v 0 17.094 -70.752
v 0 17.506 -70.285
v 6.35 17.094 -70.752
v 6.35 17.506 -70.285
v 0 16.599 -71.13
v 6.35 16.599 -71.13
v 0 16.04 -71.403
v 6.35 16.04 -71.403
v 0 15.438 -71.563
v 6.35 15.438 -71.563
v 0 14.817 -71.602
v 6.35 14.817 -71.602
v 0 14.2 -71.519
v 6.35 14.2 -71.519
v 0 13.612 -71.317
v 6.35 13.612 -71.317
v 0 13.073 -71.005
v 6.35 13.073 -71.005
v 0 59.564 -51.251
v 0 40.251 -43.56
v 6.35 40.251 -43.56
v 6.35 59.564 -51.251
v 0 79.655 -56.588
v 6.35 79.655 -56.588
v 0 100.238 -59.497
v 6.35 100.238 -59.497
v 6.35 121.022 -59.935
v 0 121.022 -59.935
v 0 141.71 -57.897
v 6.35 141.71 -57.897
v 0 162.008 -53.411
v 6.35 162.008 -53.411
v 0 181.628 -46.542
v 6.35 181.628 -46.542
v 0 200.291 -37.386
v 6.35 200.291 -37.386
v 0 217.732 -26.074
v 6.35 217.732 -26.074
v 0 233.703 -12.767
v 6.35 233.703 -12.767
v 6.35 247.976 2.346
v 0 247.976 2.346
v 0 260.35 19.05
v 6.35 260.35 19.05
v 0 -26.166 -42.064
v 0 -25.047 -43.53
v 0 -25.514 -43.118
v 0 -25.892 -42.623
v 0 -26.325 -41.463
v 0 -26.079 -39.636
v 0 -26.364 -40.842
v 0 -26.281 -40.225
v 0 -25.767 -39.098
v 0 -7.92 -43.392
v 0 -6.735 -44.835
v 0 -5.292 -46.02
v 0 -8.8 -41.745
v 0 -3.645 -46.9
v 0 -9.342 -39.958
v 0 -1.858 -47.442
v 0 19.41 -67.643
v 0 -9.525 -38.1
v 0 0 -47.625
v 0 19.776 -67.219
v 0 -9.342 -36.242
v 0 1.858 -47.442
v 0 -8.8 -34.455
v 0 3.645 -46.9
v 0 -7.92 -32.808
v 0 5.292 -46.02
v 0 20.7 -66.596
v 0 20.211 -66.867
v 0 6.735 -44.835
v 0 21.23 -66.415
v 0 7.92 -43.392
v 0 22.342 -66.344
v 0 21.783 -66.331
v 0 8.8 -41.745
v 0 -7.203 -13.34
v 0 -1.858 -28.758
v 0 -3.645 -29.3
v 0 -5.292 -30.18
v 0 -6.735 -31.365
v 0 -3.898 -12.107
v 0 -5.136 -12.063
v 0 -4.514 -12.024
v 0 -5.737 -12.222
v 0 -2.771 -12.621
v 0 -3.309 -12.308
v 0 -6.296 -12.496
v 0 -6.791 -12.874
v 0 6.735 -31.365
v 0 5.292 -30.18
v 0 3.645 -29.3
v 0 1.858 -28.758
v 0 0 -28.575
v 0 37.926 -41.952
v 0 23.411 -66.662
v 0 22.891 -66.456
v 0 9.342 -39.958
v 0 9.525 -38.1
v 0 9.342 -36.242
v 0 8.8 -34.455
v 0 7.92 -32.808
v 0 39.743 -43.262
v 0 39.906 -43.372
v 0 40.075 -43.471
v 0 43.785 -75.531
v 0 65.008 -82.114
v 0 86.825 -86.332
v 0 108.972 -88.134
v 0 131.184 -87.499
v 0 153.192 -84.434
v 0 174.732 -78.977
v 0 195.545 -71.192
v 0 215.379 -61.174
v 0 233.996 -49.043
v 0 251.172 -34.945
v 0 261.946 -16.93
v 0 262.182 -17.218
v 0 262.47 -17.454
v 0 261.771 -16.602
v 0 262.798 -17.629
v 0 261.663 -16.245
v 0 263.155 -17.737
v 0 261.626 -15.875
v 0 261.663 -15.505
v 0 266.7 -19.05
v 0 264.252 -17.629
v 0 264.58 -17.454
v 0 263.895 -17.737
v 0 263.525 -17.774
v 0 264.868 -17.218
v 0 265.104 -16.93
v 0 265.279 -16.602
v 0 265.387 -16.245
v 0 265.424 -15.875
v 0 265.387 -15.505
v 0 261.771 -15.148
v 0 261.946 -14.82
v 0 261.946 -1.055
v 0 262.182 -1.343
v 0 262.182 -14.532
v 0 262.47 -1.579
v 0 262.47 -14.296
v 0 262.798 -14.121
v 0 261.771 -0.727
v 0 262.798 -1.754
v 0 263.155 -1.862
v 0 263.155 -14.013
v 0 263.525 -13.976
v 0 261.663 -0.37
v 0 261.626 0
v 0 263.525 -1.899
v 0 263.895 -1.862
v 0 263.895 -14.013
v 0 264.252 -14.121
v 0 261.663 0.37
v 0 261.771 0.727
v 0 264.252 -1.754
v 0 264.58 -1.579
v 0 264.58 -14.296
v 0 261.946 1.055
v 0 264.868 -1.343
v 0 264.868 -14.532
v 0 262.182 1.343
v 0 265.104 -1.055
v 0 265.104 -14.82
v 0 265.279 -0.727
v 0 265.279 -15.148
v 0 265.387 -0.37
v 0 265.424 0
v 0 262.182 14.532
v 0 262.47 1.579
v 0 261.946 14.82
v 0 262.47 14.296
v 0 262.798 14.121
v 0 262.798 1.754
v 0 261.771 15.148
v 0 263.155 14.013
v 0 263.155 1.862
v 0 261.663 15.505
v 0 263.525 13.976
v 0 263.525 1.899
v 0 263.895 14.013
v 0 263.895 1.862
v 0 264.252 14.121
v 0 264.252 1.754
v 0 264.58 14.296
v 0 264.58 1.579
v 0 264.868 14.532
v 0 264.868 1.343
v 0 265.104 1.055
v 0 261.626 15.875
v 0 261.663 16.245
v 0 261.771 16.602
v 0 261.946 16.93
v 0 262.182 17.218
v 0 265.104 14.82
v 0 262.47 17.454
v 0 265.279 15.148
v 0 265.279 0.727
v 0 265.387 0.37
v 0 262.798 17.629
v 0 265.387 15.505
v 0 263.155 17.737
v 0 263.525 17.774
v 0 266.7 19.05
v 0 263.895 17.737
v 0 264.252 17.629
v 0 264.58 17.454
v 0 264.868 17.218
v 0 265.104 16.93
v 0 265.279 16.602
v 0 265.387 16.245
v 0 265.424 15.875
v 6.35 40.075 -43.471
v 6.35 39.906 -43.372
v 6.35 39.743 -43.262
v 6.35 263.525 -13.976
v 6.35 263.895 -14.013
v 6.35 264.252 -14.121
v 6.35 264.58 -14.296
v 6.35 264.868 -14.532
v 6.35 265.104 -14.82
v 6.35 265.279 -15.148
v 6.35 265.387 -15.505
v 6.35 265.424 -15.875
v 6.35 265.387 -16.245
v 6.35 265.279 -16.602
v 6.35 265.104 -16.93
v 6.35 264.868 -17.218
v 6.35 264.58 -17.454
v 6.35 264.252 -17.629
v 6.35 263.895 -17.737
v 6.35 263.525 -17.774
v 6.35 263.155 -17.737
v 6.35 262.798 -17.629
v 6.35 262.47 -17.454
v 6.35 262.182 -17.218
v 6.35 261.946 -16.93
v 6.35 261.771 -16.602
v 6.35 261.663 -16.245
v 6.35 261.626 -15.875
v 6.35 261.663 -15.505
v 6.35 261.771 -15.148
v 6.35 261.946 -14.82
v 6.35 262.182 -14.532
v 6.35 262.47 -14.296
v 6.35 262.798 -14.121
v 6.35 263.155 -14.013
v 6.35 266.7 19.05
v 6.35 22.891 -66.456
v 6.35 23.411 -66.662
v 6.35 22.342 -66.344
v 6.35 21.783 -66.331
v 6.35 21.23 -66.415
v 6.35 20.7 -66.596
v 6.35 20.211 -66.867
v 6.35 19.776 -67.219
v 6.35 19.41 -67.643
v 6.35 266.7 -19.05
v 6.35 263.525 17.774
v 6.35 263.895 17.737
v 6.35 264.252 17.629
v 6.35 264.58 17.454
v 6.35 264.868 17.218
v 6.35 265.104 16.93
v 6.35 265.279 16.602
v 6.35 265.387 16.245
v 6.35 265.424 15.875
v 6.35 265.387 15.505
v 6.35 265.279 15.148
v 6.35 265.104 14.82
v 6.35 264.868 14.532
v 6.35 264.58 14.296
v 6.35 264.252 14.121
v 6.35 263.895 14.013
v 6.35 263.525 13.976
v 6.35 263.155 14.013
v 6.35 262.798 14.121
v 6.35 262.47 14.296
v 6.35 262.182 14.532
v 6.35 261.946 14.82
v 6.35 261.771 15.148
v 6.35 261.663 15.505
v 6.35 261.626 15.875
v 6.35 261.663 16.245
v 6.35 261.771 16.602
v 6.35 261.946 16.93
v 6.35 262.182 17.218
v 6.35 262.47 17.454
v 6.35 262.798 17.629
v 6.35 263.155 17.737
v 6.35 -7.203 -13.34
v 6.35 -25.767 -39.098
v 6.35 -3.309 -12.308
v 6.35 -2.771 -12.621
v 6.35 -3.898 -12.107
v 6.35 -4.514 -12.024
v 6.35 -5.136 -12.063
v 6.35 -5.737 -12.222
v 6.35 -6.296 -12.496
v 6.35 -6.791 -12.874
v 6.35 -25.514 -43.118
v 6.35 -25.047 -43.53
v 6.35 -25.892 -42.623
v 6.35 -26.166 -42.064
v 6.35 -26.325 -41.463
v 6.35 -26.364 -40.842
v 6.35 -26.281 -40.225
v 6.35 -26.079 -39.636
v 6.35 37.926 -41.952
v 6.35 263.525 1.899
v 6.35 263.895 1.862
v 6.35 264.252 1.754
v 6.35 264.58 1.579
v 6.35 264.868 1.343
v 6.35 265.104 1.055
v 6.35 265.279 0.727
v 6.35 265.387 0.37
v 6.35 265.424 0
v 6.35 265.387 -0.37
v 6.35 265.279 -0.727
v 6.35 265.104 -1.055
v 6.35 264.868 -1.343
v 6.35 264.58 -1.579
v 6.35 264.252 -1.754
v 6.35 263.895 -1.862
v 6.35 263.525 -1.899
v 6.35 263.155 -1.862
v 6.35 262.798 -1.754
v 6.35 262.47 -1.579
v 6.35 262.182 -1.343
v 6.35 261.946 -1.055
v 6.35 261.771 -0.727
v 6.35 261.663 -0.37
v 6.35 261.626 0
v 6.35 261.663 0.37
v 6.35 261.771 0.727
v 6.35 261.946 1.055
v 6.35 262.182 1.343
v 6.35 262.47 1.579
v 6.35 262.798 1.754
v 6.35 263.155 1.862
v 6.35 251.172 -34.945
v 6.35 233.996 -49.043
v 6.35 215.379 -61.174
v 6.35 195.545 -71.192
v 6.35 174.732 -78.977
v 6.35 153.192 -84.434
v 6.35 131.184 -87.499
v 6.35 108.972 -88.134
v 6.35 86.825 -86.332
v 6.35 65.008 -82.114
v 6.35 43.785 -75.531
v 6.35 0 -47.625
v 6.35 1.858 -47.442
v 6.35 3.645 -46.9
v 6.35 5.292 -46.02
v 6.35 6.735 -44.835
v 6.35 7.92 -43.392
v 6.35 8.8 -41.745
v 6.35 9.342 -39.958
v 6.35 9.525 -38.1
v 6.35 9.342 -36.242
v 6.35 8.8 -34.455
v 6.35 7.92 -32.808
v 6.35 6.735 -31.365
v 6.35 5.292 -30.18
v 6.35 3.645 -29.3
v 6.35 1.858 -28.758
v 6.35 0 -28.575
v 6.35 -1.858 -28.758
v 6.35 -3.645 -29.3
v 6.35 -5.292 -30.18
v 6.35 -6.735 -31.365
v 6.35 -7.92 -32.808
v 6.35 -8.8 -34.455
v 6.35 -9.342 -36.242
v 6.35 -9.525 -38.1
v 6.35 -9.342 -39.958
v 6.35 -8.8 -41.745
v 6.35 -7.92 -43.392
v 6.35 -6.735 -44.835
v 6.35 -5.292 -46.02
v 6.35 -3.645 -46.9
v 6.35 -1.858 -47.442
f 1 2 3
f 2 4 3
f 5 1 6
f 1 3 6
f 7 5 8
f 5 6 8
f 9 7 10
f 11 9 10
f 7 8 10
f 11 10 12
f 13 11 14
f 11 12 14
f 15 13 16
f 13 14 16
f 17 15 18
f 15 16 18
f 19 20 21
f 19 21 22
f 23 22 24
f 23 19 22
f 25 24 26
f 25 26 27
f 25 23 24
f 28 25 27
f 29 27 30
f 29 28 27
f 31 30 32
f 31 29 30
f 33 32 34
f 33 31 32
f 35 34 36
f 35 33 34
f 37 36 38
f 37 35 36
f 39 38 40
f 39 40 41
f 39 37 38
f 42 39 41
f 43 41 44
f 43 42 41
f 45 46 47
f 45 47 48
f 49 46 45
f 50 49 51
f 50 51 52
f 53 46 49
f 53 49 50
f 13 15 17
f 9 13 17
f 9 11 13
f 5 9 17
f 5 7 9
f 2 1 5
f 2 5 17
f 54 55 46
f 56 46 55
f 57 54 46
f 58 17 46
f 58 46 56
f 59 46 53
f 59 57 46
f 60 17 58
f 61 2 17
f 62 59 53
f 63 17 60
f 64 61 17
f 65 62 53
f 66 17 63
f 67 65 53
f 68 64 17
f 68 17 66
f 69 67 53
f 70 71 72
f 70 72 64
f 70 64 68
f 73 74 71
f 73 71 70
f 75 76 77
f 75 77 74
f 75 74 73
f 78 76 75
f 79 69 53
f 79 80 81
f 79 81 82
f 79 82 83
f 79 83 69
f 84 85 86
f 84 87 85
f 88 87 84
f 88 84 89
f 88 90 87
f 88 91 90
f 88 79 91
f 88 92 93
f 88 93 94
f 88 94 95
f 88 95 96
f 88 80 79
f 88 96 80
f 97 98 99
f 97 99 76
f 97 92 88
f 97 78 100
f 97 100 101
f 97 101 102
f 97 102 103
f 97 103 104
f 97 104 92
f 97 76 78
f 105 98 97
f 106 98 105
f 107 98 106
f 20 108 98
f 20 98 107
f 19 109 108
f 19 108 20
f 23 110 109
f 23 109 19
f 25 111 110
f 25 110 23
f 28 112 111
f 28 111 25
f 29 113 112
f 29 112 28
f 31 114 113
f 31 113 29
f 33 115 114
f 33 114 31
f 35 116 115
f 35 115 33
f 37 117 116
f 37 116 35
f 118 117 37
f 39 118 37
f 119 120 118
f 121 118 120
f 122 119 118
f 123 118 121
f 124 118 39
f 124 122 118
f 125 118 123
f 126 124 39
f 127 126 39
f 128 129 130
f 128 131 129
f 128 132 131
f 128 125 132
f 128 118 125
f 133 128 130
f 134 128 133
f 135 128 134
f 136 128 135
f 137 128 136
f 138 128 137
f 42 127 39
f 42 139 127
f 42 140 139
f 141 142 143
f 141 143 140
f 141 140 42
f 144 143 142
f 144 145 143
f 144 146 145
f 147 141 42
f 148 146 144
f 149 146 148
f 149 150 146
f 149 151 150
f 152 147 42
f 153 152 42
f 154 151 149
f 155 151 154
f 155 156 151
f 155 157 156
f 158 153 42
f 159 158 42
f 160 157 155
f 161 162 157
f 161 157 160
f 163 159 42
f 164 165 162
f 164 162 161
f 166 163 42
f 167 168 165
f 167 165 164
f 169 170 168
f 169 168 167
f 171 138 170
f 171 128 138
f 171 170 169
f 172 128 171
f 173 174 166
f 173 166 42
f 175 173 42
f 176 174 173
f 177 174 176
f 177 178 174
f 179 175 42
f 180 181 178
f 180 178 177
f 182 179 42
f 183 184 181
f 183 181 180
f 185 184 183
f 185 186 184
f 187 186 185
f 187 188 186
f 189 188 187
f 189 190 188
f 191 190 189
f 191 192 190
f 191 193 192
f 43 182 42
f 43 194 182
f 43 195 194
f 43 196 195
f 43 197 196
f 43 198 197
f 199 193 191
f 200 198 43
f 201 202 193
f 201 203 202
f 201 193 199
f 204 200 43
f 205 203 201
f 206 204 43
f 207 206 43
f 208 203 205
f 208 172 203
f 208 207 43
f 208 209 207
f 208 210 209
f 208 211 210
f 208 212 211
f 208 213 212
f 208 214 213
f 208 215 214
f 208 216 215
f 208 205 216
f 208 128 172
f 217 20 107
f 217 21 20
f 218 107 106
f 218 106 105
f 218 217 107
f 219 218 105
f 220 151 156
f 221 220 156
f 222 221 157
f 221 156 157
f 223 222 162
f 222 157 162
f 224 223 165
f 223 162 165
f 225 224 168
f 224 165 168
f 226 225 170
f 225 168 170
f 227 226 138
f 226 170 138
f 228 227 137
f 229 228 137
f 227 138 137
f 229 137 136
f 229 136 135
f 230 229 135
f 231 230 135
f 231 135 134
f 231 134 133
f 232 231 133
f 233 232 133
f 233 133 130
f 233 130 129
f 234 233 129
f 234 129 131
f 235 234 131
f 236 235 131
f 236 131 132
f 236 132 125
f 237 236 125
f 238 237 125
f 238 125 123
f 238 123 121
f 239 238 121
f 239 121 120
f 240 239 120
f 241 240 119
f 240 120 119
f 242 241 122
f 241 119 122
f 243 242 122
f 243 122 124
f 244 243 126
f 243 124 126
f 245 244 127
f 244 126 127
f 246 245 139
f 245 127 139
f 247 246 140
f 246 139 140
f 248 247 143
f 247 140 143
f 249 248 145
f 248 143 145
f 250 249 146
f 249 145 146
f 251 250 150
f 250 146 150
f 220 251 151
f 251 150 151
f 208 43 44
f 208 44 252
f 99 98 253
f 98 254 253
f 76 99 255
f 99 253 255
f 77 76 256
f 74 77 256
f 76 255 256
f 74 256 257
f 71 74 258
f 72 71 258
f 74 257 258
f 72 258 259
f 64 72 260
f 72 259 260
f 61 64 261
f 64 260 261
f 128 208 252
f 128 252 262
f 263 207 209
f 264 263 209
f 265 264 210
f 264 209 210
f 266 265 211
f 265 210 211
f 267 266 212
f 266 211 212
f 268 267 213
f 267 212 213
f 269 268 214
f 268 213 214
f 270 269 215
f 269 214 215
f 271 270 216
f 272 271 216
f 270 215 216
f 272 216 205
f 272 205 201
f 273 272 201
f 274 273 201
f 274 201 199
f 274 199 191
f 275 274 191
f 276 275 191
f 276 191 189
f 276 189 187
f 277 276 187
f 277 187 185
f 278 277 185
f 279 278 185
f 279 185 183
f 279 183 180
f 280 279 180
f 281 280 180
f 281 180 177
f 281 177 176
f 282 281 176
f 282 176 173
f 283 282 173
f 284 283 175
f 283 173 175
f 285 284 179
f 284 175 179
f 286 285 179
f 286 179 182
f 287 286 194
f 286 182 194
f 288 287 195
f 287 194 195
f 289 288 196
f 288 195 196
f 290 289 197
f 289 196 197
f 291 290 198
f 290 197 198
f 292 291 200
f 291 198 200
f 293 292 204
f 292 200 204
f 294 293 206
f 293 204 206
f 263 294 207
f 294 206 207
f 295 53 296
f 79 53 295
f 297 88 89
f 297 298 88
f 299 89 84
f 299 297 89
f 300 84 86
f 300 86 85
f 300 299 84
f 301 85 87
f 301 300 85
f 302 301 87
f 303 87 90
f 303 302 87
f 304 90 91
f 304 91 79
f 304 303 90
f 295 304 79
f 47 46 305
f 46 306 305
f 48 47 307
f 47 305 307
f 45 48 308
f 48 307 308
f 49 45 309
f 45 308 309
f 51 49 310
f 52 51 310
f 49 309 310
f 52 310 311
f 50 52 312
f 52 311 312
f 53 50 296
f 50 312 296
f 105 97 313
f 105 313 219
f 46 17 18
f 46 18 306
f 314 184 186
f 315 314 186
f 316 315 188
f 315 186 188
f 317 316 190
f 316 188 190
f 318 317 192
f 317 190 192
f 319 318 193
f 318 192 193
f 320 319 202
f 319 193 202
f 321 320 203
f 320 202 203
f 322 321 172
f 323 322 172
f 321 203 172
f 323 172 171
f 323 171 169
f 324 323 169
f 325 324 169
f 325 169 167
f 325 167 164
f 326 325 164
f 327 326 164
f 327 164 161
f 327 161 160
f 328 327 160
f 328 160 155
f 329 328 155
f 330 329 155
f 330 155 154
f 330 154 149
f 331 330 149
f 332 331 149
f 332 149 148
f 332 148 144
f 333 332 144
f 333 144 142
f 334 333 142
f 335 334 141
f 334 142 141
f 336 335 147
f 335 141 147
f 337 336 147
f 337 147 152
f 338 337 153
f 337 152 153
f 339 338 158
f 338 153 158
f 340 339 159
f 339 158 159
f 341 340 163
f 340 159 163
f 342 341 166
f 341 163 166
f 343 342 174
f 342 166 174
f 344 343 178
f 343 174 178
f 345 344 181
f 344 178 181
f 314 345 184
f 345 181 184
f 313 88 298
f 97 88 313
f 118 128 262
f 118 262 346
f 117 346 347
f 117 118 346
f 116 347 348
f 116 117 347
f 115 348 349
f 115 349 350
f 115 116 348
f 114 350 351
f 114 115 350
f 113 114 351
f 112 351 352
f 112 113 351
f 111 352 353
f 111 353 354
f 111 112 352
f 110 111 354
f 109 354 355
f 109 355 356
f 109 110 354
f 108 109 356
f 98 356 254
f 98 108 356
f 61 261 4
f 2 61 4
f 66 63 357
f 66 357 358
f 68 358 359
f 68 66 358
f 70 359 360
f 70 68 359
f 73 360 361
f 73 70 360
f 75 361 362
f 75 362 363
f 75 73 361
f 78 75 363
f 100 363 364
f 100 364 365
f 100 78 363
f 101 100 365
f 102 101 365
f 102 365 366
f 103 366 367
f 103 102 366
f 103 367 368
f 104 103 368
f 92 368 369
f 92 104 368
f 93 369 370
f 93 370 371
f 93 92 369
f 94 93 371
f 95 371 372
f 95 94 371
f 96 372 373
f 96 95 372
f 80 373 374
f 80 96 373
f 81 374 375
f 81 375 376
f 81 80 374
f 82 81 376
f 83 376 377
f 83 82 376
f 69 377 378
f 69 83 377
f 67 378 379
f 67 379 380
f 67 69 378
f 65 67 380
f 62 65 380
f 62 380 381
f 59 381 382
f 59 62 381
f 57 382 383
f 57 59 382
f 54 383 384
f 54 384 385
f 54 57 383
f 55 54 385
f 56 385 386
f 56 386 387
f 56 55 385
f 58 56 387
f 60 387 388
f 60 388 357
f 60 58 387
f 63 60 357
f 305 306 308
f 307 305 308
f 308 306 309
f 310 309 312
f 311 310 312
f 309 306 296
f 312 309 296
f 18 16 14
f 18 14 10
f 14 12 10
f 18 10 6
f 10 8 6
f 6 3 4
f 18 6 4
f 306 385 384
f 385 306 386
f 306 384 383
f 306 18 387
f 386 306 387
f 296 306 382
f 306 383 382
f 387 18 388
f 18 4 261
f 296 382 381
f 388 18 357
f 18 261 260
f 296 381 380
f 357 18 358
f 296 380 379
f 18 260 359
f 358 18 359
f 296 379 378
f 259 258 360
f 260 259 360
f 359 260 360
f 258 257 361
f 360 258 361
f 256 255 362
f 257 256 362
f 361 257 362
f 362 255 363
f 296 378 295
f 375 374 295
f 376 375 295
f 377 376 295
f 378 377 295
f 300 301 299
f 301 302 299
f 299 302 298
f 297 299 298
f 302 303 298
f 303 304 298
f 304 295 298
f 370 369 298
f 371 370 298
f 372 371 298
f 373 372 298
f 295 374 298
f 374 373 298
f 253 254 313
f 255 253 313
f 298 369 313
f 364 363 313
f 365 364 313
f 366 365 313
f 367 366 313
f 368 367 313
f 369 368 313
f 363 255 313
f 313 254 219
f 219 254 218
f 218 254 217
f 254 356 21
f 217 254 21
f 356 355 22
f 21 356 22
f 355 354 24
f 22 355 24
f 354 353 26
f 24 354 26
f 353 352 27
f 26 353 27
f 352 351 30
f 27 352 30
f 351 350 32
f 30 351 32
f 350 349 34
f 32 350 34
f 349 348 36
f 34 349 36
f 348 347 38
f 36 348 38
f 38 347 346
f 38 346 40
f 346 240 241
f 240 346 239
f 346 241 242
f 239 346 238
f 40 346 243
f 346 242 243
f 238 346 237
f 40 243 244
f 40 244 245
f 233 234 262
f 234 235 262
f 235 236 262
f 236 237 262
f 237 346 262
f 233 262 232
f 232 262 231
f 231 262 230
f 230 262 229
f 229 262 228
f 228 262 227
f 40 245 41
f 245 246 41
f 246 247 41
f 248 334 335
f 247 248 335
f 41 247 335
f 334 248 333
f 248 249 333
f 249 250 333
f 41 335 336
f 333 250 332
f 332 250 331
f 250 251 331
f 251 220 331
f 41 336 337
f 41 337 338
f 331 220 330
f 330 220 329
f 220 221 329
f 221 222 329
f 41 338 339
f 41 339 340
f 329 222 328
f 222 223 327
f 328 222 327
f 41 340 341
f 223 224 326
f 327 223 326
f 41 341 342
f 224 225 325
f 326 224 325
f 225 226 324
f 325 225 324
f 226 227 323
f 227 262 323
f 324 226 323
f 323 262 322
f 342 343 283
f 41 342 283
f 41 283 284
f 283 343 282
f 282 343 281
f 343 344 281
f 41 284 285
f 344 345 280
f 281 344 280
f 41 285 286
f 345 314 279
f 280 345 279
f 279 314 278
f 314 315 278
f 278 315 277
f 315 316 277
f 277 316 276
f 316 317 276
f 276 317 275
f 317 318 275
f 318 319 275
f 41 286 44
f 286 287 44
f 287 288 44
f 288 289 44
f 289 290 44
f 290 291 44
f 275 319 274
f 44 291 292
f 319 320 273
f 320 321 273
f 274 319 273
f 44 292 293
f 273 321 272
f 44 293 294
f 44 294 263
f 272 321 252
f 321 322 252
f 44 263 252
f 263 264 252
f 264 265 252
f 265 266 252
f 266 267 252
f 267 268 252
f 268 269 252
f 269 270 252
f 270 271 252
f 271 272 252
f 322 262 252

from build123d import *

# Parameters (mm, degrees)
SKETCH1_R                 = 9.525
BOSS_EXTRUDE1_DEPTH       = 6.35
FILLET1_R                 = 3.175
F_6_CLEARANCE_HOLE1_D     = 3.7973
F_6_CLEARANCE_HOLE1_DEPTH = 6.35


with BuildPart() as part:
    # Sketch1 → Boss-Extrude1 (new body)
    with BuildSketch(Plane(origin=(0, 0, 0), x_dir=(0, 0, -1), z_dir=(1, 0, 0))):
        with BuildLine():
            Line((-19.05, 266.7), (19.05, 266.7))
            ThreePointArc((19.05, 266.7), (84.689584794, 151.864978949), (65.432294388, 21.003243067))
            Line((65.432294388, 21.003243067), (72.860995986, 15.649155186))
            Line((72.860995986, 15.649155186), (41.67338239, -27.623103343))
            Line((41.67338239, -27.623103343), (10.764626298, -5.346236488))
            Line((10.764626298, -5.346236488), (41.952239895, 37.92602204))
            Line((41.952239895, 37.92602204), (43.433779152, 39.981631379))
            ThreePointArc((43.433779152, 39.981631379), (53.452056919, 161.864823129), (-19.05, 260.35))
            Line((-19.05, 260.35), (-19.05, 266.7))
        make_face()
        with Locations((38.1, 0)):
            Circle(SKETCH1_R, mode=Mode.SUBTRACT)
    extrude(amount=BOSS_EXTRUDE1_DEPTH)

    # Fillet1
    fillet1_edges = [part.edges().sort_by_distance(p)[0] for p in [
        (3.175, 21.003243067, -65.432294388),
        (3.175, 15.649155186, -72.860995986),
        (3.175, -27.623103343, -41.67338239),
        (3.175, -5.346236488, -10.764626298),
        (3.175, 39.981631379, -43.433779152),
    ]]
    fillet(fillet1_edges, radius=FILLET1_R)

    # #6 Clearance Hole1
    with Locations(Plane(origin=(6.35, 0, 0), x_dir=(0, 0, -1), z_dir=(1, 0, 0))):
        with Locations((-15.875, 263.525), (15.875, 263.525), (0, 263.525)):
            Hole(F_6_CLEARANCE_HOLE1_D / 2, depth=F_6_CLEARANCE_HOLE1_DEPTH)


solid = part.part
